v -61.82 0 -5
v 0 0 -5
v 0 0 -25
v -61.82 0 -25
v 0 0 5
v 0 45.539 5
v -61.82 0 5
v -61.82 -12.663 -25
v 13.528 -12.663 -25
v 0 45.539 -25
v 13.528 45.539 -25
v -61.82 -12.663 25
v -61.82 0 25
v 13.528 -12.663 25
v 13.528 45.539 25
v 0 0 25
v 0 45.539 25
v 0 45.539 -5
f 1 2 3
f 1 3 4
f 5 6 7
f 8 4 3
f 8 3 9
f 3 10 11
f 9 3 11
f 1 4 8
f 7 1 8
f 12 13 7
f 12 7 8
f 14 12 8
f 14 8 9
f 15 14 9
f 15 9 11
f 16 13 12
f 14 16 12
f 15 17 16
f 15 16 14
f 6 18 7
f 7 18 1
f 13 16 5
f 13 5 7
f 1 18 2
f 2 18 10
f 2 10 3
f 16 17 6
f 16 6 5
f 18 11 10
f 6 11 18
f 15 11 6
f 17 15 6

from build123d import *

# Parameters (mm, degrees)
BOSS_EXTRUDE2_DEPTH = 25
RIB4_REACH          = 82.75
SKETCH2_WALL_W      = 240.282714568
SKETCH2_WALL_H      = 10


with BuildPart() as part:
    # Sketch1 → Boss-Extrude2 (new, symmetric)
    with BuildSketch(Plane.XY):
        Polygon((0, 0), (-61.820224508, 0), (-61.820224508, -12.662921305), (0, -12.662921305), (13.528089841, -12.662921305), (13.528089841, 45.539325687), (0, 45.539325687), align=None)
    extrude(amount=BOSS_EXTRUDE2_DEPTH, both=True)

    # Sketch2 wall → Rib4 (add, up to next)
    with BuildSketch(Plane(origin=(-30.910112254, 22.769662844, 0), x_dir=(-0.805133069987, -0.593094208042, 0), z_dir=(0.593094208042, -0.805133069987, 0)), mode=Mode.PRIVATE) as rib4_sk1:
        Rectangle(SKETCH2_WALL_W, SKETCH2_WALL_H)
    rib4_tool1 = extrude(rib4_sk1.sketch, amount=RIB4_REACH, mode=Mode.PRIVATE) - part.part
    add(rib4_tool1.solids().sort_by_distance((-30.910112254, 22.769662844, 0))[0])


solid = part.part
